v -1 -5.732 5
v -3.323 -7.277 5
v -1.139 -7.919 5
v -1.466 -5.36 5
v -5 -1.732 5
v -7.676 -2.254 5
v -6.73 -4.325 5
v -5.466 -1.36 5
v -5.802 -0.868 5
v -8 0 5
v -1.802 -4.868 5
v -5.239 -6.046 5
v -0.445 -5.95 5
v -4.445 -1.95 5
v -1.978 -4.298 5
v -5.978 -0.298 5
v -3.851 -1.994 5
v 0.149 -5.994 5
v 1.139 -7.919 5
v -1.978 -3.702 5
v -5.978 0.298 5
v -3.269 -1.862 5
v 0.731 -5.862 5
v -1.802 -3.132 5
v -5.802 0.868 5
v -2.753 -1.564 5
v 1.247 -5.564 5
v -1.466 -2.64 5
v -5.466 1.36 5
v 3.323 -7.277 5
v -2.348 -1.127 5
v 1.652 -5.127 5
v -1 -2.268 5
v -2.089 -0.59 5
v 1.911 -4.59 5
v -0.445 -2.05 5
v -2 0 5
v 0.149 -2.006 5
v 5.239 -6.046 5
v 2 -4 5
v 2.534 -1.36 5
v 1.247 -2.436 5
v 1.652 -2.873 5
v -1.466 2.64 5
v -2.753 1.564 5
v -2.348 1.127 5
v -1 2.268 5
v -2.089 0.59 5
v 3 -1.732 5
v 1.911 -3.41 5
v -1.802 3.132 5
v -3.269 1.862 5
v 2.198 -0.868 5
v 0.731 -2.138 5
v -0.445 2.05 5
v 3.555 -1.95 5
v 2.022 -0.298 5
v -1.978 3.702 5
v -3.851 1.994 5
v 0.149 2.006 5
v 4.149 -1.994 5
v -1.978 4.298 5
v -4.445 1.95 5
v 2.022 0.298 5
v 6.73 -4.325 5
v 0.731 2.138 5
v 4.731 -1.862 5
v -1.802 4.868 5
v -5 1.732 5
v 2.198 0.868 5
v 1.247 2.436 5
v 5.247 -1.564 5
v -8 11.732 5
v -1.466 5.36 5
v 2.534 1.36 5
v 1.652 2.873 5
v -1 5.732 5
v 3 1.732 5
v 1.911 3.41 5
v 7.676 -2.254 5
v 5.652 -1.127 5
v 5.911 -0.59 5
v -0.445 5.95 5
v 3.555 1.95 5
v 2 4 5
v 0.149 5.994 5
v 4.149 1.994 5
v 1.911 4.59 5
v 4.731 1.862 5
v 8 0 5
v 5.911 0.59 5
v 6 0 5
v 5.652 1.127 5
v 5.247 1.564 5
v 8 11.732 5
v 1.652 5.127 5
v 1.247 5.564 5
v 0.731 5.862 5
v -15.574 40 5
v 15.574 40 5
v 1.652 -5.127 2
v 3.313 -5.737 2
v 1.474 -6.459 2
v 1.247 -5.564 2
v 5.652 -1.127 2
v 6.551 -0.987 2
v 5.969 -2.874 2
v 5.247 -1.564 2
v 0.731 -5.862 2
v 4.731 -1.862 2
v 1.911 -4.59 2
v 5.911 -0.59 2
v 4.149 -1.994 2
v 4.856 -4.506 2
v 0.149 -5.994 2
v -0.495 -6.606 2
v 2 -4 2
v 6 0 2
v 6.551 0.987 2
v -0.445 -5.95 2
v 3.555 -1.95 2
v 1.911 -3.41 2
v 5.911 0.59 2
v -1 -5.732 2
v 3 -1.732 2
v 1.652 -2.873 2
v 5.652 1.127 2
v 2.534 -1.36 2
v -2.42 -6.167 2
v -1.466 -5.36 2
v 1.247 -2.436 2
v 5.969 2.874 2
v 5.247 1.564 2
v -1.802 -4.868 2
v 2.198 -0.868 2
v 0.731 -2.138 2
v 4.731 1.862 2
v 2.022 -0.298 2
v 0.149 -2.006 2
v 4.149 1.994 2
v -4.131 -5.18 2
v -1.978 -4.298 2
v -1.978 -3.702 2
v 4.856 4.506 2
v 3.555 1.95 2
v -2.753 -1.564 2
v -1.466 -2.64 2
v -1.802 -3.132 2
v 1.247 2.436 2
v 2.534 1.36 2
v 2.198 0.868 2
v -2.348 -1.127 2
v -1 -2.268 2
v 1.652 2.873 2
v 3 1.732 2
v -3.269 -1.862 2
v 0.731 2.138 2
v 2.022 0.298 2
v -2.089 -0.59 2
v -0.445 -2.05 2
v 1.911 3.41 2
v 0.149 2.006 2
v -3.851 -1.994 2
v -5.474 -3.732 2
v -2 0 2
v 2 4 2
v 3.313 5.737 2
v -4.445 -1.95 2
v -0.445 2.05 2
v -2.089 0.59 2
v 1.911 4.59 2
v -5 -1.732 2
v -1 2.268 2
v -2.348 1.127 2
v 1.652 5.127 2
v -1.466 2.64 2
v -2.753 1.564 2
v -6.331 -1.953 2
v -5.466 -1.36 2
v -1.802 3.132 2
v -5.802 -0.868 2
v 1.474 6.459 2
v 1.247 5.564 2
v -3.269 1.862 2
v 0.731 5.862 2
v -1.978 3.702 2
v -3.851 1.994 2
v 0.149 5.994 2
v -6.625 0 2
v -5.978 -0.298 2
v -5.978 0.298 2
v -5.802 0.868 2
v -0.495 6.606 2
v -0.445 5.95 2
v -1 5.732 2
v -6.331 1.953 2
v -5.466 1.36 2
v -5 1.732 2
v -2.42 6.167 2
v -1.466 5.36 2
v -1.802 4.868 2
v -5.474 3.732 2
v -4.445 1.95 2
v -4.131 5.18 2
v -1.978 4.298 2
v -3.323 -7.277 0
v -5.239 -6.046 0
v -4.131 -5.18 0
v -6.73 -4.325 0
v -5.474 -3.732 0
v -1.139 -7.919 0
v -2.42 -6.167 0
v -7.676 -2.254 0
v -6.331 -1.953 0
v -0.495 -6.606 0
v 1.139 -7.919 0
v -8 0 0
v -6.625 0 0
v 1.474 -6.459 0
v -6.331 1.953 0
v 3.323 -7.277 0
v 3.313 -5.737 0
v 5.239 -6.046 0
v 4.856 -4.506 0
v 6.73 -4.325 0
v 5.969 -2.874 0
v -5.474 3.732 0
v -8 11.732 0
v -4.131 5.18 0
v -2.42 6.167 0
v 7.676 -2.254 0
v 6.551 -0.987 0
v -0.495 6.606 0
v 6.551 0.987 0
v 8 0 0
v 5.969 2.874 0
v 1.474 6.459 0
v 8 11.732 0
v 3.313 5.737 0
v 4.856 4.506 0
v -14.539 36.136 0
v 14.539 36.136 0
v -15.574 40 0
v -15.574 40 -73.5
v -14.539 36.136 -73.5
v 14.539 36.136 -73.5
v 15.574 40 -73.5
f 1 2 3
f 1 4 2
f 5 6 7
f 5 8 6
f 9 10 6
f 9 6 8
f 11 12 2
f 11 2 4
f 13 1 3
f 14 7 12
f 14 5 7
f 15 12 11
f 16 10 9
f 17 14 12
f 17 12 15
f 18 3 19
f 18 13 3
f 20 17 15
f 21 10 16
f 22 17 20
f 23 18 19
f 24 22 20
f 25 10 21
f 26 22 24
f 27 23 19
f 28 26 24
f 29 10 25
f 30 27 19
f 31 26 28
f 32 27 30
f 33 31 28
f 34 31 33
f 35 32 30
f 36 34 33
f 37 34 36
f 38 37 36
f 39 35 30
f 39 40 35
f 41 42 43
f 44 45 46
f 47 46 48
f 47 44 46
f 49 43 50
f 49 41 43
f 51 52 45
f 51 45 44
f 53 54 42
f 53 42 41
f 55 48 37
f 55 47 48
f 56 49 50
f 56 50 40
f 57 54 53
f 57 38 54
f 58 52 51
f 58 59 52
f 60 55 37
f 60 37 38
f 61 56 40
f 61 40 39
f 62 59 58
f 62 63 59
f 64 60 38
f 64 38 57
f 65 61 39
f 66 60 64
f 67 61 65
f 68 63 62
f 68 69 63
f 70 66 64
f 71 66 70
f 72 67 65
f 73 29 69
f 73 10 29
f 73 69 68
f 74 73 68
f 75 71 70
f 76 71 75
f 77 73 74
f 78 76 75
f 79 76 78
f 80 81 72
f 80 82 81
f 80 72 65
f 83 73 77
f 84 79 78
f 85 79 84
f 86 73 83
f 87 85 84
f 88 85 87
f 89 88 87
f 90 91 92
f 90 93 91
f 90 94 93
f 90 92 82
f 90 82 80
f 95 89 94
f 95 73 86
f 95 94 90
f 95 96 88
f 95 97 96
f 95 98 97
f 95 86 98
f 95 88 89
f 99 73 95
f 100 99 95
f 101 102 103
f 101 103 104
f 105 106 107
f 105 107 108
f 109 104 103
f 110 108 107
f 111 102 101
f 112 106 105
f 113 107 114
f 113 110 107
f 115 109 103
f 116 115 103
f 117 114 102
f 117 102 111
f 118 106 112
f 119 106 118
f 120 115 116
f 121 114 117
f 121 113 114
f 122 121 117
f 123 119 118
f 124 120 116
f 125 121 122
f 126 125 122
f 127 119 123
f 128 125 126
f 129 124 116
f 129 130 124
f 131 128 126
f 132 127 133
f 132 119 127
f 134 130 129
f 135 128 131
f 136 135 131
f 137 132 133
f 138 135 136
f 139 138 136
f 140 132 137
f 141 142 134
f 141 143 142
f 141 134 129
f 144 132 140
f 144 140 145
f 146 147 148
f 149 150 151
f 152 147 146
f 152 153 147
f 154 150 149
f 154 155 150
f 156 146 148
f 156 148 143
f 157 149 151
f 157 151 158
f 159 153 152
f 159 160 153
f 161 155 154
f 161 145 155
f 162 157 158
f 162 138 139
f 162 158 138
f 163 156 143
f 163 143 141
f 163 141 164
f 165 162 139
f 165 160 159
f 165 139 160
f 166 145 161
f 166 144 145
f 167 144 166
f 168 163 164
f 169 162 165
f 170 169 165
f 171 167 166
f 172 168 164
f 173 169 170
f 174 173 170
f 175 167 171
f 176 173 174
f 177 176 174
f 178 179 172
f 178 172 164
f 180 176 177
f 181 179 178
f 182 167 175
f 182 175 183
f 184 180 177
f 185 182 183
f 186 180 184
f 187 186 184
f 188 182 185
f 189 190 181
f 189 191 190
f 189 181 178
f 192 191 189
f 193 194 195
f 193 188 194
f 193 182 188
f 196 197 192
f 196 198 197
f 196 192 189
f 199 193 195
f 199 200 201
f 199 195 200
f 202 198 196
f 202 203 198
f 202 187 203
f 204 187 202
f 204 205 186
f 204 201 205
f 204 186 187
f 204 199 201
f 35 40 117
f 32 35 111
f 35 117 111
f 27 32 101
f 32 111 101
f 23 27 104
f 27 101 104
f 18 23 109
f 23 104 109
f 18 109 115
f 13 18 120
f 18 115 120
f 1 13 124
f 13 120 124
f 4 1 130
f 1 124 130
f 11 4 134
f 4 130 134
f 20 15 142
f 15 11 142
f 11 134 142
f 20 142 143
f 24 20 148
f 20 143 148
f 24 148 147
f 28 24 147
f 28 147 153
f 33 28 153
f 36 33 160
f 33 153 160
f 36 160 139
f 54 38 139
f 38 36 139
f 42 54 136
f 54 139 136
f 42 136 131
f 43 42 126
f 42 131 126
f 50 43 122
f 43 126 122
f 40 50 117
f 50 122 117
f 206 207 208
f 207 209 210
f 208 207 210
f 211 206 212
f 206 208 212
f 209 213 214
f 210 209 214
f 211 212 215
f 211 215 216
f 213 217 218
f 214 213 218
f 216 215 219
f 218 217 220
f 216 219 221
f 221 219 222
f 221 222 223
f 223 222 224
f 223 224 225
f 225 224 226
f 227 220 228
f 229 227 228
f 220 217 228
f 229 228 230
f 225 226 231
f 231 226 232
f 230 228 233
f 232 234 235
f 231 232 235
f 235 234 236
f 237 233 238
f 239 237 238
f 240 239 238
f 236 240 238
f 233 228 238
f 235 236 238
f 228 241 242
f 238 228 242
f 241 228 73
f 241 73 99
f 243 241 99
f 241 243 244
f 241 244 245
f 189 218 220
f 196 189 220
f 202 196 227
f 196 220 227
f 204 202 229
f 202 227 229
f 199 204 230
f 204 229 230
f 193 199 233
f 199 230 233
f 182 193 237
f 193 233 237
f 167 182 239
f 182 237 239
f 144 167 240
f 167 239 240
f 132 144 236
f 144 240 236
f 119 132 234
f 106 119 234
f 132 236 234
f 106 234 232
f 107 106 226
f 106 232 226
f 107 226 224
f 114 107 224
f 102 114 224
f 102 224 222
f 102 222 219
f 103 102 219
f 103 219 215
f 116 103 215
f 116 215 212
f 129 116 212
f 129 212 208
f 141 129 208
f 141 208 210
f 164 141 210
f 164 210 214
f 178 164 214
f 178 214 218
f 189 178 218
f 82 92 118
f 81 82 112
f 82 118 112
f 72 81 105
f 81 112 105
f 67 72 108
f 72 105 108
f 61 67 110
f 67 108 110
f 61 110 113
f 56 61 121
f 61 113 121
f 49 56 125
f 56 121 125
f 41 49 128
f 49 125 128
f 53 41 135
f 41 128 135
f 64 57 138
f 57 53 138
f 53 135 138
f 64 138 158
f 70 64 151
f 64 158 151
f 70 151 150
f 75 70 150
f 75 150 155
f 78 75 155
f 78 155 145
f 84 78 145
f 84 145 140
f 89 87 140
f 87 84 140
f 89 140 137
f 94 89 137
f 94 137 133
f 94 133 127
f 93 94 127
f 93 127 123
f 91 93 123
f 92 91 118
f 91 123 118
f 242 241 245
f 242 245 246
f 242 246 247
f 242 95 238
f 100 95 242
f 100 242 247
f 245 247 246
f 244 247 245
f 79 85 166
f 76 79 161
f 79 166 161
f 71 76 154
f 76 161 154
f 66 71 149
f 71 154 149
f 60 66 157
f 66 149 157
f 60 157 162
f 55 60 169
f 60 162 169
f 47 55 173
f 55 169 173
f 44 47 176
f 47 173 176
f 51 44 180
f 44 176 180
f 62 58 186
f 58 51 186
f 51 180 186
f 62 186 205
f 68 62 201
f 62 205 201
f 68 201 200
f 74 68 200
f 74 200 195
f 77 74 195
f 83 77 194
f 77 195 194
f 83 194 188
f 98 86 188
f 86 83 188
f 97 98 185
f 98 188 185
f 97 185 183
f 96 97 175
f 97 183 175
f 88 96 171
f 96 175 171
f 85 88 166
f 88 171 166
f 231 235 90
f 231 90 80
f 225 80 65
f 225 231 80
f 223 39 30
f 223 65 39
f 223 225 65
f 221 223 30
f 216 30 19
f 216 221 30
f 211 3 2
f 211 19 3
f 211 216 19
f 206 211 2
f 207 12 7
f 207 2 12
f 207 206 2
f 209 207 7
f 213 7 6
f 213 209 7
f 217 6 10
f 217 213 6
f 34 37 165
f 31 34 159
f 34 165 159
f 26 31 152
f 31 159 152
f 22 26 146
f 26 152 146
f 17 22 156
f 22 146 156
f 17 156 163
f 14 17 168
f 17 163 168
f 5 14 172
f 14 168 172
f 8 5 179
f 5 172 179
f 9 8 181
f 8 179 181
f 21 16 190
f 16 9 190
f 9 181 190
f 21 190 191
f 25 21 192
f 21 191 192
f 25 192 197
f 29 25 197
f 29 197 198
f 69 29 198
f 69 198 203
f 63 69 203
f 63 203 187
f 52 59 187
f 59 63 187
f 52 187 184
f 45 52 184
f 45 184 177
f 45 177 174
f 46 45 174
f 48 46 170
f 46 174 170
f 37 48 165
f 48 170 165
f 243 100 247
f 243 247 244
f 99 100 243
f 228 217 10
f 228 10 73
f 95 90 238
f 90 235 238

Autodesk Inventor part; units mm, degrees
ref_plane "YZ Plane" through (0, 0, 0) normal (1, 0, 0) x (0, 1, 0)
ref_plane "XZ Plane" through (0, 0, 0) normal (0, 1, 0) x (-1, 0, 0)
ref_plane "XY Plane" through (0, 0, 0) normal (0, 0, 1) x (1, 0, 0)
sketch "Sketch1" plane through (0, 0, 0) normal (0, 0, 1) x (1, 0, 0)
  circle A0 centre (0, 4) radius 2
  circle A1 centre (-4, 0) radius 2
  circle A2 centre (0, -4) radius 2
  circle A3 centre (4, 0) radius 2
  line L0 (7, 40) -> (-7, 40)
  line L1 (8, 11.7321) -> (15.5744, 40)
  line L2 (7, 8) -> (40.1288, 8) construction
  line L3 (15.5744, 40) -> (7, 40)
  line L4 (-8, 11.7321) -> (-15.5744, 40)
  line L5 (-15.5744, 40) -> (-7, 40)
  line L6 (8, 0) -> (8, 11.7321)
  line L7 (-8, 0) -> (-8, 11.7321)
  arc A4 (-8, 0) -> (8, 0) centre (0, 0) ccw
  dimension "d2" = 4
  dimension "d5" = 360
extrude "Extrusion1" add sketch "Sketch1" along normal blind 5
sketch "Sketch2" plane through (0, 0, 0) normal (0, 0, -1) x (-1, 0, 0)
  circle A0 centre (0, 0) radius 6.625
  dimension "d18" = 13.25
extrude "Extrusion2" cut sketch "Sketch2" against normal blind 2
sketch "Sketch3" plane through (0, 0, 0) normal (0, 0, -1) x (-1, 0, 0)
  line L0 (-8, 11.7321) -> (-15.5744, 40) projected
  line L1 (-15.5744, 40) -> (15.5744, 40) projected
  line L2 (-15.5744, 40) -> (15.5744, 40)
  line L3 (15.5744, 40) -> (14.5391, 36.1363)
  line L4 (15.5744, 40) -> (8, 11.7321) projected
  line L5 (14.5391, 36.1363) -> (-14.5391, 36.1363)
  line L6 (-14.5391, 36.1363) -> (-15.5744, 40)
  point P0 (0, 0)
  dimension "d21" = 4
extrude "Extrusion3" add sketch "Sketch3" along normal blind 73.5
properties part number "OutPut_Shaft_From_Gearbox"
